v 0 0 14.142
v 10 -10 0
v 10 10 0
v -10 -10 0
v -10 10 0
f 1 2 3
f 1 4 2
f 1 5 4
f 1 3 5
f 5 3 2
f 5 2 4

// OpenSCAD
polyhedron(
  points=[ [10,10,0],[10,-10,0],[-10,-10,0],[-10,10,0], // vier punkte des fundaments
           [0,0,10*sqrt(2)]  ],                                 // spitze
  triangles=[ [0,1,4],[1,2,4],[2,3,4],[3,0,4],          // vier seiten
              [1,0,3],[2,1,3] ]                         // zwei dreiecke als basis
 );
